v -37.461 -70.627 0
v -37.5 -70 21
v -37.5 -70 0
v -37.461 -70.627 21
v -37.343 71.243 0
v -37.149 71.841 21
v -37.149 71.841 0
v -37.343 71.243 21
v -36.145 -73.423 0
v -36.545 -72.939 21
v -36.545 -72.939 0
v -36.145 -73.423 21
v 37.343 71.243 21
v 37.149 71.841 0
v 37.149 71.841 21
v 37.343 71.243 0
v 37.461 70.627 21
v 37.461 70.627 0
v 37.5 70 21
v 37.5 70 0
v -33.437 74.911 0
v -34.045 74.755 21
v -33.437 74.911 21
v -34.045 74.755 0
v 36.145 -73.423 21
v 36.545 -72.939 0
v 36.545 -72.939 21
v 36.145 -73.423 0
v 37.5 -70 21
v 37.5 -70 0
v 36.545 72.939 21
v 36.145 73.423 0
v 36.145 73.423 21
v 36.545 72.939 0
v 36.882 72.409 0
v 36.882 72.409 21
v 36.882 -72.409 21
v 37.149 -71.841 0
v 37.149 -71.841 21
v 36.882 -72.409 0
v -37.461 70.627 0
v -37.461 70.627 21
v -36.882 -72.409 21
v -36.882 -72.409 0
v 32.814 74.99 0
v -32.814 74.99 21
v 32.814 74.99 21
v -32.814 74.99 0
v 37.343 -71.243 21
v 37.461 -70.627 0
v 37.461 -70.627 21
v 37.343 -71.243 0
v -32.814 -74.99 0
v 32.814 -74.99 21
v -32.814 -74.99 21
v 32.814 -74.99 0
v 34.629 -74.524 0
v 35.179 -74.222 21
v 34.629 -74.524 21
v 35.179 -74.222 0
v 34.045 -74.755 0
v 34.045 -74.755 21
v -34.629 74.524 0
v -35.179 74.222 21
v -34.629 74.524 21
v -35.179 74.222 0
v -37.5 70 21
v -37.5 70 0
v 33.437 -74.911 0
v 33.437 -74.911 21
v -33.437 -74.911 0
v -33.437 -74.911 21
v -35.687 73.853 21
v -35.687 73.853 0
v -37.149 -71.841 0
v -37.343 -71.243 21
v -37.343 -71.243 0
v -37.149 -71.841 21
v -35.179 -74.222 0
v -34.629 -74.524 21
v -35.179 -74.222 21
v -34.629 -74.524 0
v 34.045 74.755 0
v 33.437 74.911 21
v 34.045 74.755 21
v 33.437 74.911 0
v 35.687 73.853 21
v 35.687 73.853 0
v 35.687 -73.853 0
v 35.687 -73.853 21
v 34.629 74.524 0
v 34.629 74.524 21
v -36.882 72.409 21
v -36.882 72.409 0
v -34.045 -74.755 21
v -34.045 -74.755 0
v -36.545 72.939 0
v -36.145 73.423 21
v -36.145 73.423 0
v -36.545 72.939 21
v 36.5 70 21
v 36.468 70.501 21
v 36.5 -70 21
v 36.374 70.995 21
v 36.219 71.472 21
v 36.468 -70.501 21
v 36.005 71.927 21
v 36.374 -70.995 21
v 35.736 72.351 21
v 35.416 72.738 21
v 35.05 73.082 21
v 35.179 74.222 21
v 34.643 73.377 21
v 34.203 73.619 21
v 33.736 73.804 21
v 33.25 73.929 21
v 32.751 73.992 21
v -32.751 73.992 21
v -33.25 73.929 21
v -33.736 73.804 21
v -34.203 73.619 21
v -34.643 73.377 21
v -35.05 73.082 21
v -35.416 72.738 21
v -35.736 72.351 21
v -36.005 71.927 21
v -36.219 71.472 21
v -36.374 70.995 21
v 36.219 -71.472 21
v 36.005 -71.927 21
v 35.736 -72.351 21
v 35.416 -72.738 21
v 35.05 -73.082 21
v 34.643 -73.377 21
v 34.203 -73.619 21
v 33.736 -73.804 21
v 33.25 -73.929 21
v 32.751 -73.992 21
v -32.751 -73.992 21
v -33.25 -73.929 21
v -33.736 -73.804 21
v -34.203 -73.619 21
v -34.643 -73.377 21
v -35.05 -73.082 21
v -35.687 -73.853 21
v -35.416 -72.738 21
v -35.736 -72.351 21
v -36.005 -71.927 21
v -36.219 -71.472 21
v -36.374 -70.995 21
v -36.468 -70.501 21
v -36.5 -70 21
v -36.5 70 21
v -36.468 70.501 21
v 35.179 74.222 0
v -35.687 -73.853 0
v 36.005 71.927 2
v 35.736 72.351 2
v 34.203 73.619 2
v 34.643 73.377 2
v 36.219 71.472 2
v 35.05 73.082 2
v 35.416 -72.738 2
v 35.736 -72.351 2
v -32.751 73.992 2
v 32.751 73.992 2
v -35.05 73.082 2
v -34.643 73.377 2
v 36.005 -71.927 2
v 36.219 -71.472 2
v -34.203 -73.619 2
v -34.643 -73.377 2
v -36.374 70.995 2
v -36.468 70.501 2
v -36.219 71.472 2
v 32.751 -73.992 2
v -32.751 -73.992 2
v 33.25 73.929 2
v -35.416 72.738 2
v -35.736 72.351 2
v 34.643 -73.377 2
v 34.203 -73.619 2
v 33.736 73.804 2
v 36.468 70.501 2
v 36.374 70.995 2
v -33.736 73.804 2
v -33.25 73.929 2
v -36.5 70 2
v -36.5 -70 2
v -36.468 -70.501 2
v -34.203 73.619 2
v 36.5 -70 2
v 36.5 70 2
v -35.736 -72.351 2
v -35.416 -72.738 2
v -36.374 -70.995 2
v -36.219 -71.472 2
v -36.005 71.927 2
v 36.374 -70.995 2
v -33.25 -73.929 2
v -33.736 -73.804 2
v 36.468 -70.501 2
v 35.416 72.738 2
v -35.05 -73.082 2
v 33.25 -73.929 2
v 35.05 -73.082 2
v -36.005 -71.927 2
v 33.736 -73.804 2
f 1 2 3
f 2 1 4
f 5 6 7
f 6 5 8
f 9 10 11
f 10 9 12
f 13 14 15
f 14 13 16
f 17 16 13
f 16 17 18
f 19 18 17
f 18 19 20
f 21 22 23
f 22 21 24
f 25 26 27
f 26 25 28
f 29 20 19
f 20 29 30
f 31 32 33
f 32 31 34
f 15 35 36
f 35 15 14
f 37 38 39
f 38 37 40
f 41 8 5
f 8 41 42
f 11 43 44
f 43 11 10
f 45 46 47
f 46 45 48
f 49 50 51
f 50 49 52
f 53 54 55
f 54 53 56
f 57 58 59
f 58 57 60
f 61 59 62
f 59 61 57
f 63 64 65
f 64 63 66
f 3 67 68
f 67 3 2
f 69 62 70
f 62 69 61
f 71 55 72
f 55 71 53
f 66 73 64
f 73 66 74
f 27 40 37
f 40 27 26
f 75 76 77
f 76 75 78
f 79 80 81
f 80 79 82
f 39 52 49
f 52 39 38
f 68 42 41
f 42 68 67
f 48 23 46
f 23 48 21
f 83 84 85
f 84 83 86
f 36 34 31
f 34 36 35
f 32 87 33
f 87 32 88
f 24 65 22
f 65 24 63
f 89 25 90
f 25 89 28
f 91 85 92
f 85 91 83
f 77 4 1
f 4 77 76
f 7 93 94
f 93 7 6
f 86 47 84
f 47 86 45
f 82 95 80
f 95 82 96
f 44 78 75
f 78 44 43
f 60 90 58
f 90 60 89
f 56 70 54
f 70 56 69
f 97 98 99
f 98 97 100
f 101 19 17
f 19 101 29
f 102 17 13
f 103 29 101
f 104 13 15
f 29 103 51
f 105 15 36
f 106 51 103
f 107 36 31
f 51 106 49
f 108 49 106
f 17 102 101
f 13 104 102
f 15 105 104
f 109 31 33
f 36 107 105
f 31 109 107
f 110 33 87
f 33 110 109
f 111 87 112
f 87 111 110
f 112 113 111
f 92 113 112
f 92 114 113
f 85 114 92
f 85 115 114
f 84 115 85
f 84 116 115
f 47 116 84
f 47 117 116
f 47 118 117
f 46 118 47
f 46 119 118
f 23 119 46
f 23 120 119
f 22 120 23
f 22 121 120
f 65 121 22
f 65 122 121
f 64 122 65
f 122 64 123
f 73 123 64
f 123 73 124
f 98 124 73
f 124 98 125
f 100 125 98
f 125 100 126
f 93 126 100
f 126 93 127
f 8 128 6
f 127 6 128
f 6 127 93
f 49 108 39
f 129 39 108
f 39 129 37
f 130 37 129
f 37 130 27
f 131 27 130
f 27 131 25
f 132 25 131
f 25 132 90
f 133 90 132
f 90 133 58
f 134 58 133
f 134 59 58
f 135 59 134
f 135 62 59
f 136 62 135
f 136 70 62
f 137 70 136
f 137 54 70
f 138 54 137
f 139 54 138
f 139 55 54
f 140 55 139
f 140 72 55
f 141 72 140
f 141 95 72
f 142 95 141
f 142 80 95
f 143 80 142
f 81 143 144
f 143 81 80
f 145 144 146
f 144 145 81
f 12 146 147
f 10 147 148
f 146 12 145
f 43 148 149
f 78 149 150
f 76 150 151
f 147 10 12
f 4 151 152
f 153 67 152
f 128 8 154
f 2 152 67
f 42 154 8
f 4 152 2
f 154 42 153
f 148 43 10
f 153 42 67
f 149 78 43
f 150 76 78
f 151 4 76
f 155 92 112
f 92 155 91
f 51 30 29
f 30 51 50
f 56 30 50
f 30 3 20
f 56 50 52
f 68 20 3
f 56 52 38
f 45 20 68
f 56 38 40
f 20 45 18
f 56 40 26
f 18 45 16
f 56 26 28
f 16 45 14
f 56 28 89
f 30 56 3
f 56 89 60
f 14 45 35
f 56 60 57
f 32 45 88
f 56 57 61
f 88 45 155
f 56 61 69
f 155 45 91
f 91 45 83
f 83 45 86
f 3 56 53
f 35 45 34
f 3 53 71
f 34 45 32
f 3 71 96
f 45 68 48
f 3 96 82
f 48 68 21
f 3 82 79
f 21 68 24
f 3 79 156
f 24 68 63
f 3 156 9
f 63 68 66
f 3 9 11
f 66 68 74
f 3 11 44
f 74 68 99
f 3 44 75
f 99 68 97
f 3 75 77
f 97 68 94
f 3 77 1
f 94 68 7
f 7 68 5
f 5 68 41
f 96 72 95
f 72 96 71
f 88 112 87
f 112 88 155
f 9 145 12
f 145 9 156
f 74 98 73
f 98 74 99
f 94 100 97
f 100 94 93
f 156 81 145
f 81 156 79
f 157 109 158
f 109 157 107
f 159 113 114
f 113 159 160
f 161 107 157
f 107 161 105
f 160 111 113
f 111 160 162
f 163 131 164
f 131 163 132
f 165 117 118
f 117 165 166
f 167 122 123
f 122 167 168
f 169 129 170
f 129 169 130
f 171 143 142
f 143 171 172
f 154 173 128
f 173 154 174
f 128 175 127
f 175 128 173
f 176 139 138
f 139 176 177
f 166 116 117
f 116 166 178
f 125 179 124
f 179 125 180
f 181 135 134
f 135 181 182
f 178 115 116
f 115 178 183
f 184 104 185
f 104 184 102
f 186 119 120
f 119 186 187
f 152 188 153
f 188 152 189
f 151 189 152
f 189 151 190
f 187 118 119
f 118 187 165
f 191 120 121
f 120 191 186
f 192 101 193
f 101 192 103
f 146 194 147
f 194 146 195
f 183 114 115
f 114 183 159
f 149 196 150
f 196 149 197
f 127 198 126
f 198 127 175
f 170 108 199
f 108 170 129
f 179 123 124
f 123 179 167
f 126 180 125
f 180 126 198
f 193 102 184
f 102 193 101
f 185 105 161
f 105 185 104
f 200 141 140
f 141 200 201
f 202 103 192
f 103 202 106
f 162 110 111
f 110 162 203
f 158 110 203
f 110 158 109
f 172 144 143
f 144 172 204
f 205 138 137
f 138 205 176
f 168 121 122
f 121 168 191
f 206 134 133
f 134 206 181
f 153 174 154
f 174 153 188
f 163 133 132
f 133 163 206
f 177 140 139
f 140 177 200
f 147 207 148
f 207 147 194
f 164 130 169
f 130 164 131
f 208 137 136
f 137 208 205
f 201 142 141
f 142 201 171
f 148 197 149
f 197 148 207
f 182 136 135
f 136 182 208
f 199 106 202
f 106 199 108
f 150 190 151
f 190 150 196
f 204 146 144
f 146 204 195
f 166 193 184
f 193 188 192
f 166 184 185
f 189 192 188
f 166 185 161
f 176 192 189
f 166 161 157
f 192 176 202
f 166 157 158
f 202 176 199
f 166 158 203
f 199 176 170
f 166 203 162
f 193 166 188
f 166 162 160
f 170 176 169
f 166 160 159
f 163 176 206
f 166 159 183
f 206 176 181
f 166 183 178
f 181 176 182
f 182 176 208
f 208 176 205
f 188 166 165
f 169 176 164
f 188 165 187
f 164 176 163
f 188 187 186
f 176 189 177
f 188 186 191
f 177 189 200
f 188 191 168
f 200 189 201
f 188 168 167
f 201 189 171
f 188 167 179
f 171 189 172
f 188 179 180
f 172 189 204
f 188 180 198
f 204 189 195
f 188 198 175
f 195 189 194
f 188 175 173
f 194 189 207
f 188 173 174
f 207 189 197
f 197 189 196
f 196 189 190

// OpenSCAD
$fn = 50;


difference() {
	union() {
		hull() {
			translate(v = [-32.5000000000, 70.0000000000, 0]) {
				cylinder(h = 21, r = 5);
			}
			translate(v = [32.5000000000, 70.0000000000, 0]) {
				cylinder(h = 21, r = 5);
			}
			translate(v = [-32.5000000000, -70.0000000000, 0]) {
				cylinder(h = 21, r = 5);
			}
			translate(v = [32.5000000000, -70.0000000000, 0]) {
				cylinder(h = 21, r = 5);
			}
		}
	}
	union() {
		translate(v = [0, 0, 2]) {
			hull() {
				translate(v = [-32.5000000000, 70.0000000000, 0]) {
					cylinder(h = 19, r = 4);
				}
				translate(v = [32.5000000000, 70.0000000000, 0]) {
					cylinder(h = 19, r = 4);
				}
				translate(v = [-32.5000000000, -70.0000000000, 0]) {
					cylinder(h = 19, r = 4);
				}
				translate(v = [32.5000000000, -70.0000000000, 0]) {
					cylinder(h = 19, r = 4);
				}
			}
		}
	}
}
